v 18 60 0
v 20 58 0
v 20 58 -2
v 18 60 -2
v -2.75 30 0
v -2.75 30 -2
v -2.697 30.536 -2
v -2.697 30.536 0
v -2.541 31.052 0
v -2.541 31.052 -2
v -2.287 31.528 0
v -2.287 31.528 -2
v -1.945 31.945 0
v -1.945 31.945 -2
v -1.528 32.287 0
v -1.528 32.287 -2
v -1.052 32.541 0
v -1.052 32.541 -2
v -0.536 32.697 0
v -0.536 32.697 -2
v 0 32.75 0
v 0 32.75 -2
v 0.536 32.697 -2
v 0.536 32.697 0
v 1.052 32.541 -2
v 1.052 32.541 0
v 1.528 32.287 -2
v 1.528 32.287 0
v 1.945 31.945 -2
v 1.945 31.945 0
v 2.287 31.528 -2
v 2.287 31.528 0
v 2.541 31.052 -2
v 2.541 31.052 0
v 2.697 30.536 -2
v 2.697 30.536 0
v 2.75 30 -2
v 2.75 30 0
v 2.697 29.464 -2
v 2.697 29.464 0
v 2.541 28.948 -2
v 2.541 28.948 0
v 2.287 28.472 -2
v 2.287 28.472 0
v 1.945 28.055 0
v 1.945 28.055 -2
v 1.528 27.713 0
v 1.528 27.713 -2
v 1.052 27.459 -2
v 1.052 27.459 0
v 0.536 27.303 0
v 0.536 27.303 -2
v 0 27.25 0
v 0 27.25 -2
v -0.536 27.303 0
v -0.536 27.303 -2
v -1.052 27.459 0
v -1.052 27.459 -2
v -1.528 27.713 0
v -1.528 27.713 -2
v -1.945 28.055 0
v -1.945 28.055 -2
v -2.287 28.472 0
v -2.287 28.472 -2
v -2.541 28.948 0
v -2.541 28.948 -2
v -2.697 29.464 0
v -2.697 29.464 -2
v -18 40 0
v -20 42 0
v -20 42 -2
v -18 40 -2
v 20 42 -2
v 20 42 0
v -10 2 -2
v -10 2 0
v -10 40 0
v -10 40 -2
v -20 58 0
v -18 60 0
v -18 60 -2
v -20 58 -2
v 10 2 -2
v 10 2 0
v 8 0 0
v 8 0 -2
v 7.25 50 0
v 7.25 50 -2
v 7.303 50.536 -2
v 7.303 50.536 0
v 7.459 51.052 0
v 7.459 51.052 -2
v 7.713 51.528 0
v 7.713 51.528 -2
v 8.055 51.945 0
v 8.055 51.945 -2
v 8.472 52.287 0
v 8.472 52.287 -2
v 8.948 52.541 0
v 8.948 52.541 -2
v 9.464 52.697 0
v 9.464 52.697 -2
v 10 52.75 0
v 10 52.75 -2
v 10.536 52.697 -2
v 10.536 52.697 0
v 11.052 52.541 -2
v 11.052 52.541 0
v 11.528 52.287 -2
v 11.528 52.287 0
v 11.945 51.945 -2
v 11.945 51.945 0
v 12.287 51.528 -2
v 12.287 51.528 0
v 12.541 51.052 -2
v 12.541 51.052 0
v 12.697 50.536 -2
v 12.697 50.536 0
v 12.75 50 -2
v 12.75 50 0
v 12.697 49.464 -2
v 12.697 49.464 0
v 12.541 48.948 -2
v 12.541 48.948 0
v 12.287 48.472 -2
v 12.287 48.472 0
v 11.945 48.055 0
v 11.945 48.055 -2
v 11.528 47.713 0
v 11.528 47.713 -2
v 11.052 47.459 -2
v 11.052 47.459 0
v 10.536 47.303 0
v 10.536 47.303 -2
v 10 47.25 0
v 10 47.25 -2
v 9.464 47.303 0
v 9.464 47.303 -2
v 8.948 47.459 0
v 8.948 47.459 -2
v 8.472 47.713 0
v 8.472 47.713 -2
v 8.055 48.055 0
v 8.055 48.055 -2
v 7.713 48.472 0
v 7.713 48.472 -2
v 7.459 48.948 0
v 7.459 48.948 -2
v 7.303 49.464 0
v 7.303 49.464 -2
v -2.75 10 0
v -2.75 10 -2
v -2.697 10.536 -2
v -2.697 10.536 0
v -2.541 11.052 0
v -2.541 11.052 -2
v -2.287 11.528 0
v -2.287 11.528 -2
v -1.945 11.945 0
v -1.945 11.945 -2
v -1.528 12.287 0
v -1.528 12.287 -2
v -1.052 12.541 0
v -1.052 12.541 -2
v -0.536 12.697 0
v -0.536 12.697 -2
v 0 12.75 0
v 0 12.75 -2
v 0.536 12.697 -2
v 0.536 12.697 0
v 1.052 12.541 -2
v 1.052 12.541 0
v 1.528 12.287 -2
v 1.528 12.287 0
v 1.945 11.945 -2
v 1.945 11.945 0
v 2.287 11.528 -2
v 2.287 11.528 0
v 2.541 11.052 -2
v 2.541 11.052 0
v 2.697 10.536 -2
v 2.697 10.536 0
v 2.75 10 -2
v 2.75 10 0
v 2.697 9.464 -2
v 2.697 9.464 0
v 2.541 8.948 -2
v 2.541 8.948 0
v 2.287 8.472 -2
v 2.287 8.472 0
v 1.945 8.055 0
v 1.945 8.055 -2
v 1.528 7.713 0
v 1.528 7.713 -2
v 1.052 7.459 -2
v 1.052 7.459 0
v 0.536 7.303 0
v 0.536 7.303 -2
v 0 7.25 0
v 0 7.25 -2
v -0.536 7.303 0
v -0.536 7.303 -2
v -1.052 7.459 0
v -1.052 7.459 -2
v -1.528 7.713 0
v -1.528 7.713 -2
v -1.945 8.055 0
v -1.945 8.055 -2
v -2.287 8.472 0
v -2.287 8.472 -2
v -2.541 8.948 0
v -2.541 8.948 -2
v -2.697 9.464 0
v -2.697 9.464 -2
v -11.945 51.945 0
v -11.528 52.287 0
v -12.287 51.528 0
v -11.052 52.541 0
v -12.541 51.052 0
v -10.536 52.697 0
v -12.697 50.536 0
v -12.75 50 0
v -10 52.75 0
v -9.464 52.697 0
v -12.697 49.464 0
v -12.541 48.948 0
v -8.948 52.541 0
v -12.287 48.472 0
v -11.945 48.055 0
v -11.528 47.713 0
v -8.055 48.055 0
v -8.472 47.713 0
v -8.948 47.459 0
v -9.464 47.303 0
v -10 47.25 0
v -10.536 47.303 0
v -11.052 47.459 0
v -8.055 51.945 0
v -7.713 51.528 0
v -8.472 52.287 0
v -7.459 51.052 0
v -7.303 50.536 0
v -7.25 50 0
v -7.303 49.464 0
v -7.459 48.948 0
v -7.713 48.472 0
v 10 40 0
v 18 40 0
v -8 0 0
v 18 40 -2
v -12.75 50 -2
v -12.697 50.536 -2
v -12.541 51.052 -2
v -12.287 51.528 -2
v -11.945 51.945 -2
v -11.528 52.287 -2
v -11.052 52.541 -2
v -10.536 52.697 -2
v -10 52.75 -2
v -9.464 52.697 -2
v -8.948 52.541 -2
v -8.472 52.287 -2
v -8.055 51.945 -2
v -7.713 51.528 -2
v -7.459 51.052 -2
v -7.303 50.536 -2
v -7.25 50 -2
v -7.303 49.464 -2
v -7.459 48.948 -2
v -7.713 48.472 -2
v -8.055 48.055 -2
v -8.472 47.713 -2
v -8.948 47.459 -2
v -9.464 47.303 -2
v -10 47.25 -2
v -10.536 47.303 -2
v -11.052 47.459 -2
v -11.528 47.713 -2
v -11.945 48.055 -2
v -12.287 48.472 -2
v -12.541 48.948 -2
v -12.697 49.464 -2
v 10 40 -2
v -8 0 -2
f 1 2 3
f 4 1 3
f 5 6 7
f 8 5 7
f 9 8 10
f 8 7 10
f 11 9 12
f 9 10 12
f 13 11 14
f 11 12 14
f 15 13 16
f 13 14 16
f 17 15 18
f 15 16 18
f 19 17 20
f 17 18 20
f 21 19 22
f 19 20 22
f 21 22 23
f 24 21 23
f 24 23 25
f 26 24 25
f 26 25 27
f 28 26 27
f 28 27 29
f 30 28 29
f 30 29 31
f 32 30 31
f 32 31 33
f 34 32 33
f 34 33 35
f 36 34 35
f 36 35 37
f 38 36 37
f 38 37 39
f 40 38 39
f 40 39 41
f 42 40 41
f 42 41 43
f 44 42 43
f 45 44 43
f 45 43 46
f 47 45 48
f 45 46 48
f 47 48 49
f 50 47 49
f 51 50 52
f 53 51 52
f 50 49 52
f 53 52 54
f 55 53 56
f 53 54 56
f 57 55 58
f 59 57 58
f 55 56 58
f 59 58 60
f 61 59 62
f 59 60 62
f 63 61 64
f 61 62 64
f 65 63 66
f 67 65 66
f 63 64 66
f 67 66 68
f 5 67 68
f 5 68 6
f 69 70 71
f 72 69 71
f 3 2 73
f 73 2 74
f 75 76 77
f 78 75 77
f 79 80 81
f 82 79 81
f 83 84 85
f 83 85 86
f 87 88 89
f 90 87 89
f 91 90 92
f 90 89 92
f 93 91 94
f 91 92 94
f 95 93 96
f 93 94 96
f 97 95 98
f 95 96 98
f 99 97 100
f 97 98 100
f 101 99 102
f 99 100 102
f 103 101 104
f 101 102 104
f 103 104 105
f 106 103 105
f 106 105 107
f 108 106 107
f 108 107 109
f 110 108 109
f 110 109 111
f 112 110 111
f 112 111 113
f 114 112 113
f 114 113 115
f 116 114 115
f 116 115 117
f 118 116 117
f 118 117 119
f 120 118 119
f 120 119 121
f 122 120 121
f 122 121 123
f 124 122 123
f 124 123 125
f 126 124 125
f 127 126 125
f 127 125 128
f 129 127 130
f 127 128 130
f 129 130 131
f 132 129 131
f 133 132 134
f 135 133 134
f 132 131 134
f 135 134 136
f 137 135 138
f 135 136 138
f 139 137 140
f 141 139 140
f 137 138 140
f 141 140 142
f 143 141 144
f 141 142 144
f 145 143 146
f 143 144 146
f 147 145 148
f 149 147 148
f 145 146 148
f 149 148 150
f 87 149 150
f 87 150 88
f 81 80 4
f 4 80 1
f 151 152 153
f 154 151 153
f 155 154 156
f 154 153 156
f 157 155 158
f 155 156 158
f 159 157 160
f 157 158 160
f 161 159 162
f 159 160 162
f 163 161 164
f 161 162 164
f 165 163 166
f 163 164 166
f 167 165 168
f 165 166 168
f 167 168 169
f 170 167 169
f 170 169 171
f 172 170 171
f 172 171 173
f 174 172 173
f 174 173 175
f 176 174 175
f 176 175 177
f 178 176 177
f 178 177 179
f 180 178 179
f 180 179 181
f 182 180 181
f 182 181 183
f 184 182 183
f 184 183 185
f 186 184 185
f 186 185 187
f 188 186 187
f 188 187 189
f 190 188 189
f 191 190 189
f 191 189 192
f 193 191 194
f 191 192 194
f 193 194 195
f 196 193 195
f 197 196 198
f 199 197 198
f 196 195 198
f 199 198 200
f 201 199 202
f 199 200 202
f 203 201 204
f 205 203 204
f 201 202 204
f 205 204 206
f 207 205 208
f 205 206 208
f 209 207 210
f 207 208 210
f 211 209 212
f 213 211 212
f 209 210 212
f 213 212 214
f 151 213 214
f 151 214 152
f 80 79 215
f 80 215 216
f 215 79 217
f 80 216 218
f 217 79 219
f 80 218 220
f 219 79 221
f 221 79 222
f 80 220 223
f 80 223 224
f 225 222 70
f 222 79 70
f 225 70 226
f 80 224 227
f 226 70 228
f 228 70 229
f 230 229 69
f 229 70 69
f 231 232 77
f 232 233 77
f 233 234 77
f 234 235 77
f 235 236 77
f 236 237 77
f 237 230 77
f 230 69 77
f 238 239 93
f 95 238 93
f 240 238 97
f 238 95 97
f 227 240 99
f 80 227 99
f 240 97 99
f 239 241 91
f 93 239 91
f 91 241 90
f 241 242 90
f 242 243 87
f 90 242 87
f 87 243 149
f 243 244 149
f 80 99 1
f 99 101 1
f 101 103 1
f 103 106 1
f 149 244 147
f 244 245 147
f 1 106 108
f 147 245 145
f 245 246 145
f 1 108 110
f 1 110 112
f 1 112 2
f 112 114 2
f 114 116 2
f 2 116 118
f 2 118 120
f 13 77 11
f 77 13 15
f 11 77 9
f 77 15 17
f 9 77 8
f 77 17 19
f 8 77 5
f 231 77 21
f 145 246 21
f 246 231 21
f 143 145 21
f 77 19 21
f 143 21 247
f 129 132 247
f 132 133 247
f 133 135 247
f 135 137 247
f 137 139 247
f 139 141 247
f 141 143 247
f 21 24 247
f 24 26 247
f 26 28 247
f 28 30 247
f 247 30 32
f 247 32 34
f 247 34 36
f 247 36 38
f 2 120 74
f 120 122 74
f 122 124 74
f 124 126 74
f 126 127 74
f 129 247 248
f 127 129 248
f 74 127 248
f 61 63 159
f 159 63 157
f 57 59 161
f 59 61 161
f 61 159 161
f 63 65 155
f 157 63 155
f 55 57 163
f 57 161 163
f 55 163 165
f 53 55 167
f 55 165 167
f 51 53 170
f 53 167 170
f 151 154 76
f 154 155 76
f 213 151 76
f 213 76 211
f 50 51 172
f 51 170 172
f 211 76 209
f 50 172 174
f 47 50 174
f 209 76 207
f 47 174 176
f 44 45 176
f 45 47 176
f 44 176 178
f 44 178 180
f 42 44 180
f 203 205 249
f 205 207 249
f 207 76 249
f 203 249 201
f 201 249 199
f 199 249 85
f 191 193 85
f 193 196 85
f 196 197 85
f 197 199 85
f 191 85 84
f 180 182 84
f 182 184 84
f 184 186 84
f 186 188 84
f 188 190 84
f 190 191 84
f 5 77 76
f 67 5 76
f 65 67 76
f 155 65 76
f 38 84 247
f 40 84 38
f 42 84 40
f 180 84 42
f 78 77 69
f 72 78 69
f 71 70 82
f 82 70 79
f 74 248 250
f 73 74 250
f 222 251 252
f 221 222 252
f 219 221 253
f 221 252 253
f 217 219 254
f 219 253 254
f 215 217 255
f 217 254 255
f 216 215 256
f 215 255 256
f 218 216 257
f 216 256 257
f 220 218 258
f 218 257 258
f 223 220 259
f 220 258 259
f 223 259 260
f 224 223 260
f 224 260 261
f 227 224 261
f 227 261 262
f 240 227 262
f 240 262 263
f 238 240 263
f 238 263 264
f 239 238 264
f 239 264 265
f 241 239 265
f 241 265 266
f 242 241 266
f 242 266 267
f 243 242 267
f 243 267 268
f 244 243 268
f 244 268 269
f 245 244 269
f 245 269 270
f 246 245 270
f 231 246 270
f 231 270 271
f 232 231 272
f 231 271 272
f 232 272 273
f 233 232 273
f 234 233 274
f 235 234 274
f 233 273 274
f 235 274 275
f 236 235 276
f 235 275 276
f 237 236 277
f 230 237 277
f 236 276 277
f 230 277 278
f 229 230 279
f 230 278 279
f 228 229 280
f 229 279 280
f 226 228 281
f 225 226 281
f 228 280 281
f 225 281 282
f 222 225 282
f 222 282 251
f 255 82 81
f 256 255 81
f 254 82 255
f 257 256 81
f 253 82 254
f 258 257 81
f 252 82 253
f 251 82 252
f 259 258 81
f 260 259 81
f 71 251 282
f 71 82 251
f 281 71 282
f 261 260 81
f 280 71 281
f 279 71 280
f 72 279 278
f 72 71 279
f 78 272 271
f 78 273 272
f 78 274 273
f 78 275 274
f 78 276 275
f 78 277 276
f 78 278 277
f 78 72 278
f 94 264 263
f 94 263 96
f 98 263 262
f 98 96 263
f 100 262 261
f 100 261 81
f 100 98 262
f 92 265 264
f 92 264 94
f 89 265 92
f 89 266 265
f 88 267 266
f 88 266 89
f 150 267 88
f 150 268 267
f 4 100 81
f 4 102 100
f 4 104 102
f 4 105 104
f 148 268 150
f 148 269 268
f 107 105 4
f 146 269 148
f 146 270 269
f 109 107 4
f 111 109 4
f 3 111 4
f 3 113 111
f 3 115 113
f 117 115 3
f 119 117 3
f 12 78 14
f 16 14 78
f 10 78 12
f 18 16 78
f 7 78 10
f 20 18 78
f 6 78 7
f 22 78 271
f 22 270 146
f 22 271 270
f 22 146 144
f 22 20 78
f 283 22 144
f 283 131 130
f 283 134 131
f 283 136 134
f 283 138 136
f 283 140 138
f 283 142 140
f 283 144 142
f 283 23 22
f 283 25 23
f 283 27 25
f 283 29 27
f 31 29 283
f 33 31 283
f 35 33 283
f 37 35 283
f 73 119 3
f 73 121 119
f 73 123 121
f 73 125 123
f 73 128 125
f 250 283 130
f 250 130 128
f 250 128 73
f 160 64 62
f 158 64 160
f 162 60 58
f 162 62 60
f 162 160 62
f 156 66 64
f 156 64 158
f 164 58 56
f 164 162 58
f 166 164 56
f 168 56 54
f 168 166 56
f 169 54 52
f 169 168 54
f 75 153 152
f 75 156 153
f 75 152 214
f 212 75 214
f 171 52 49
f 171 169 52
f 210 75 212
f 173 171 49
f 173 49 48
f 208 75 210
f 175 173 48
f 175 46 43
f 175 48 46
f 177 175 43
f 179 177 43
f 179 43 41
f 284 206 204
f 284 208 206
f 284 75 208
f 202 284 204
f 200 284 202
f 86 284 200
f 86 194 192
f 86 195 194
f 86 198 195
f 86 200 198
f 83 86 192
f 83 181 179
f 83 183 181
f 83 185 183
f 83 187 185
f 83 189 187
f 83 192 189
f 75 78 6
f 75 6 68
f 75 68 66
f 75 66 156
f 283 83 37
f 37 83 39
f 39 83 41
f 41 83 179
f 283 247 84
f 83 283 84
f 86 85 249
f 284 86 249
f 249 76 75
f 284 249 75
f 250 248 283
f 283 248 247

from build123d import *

# Parameters (mm, degrees)
EXTRUDE_1_DEPTH   = 2
CHAMFER_1_SIZE    = 2
HOLE_WIZARD_M51_D = 5.5


with BuildPart() as part:
    # Эскиз1 → Бобышка-Вытянуть1 (new body)
    with BuildSketch(Plane(origin=(0, 0, 0), x_dir=(1, 0, 0), z_dir=(0, 0, -1))):
        Polygon((10, 0), (-10, 0), (-10, -40), (-20, -40), (-20, -60), (20, -60), (20, -40), (10, -40), align=None)
    extrude(amount=EXTRUDE_1_DEPTH)

    # Фаска1
    chamfer_1_edges = [part.edges().sort_by_distance(p)[0] for p in [
        (-10, 0, -1),
        (10, 0, -1),
        (20, 40, -1),
        (20, 60, -1),
        (-20, 60, -1),
        (-20, 40, -1),
    ]]
    chamfer(chamfer_1_edges, length=CHAMFER_1_SIZE)

    # Отверстие с зазором M51 (through all)
    with Locations(Plane.XY):
        with Locations((-10, 50), (10, 50), (0, 30), (0, 10)):
            Hole(HOLE_WIZARD_M51_D / 2)


solid = part.part
